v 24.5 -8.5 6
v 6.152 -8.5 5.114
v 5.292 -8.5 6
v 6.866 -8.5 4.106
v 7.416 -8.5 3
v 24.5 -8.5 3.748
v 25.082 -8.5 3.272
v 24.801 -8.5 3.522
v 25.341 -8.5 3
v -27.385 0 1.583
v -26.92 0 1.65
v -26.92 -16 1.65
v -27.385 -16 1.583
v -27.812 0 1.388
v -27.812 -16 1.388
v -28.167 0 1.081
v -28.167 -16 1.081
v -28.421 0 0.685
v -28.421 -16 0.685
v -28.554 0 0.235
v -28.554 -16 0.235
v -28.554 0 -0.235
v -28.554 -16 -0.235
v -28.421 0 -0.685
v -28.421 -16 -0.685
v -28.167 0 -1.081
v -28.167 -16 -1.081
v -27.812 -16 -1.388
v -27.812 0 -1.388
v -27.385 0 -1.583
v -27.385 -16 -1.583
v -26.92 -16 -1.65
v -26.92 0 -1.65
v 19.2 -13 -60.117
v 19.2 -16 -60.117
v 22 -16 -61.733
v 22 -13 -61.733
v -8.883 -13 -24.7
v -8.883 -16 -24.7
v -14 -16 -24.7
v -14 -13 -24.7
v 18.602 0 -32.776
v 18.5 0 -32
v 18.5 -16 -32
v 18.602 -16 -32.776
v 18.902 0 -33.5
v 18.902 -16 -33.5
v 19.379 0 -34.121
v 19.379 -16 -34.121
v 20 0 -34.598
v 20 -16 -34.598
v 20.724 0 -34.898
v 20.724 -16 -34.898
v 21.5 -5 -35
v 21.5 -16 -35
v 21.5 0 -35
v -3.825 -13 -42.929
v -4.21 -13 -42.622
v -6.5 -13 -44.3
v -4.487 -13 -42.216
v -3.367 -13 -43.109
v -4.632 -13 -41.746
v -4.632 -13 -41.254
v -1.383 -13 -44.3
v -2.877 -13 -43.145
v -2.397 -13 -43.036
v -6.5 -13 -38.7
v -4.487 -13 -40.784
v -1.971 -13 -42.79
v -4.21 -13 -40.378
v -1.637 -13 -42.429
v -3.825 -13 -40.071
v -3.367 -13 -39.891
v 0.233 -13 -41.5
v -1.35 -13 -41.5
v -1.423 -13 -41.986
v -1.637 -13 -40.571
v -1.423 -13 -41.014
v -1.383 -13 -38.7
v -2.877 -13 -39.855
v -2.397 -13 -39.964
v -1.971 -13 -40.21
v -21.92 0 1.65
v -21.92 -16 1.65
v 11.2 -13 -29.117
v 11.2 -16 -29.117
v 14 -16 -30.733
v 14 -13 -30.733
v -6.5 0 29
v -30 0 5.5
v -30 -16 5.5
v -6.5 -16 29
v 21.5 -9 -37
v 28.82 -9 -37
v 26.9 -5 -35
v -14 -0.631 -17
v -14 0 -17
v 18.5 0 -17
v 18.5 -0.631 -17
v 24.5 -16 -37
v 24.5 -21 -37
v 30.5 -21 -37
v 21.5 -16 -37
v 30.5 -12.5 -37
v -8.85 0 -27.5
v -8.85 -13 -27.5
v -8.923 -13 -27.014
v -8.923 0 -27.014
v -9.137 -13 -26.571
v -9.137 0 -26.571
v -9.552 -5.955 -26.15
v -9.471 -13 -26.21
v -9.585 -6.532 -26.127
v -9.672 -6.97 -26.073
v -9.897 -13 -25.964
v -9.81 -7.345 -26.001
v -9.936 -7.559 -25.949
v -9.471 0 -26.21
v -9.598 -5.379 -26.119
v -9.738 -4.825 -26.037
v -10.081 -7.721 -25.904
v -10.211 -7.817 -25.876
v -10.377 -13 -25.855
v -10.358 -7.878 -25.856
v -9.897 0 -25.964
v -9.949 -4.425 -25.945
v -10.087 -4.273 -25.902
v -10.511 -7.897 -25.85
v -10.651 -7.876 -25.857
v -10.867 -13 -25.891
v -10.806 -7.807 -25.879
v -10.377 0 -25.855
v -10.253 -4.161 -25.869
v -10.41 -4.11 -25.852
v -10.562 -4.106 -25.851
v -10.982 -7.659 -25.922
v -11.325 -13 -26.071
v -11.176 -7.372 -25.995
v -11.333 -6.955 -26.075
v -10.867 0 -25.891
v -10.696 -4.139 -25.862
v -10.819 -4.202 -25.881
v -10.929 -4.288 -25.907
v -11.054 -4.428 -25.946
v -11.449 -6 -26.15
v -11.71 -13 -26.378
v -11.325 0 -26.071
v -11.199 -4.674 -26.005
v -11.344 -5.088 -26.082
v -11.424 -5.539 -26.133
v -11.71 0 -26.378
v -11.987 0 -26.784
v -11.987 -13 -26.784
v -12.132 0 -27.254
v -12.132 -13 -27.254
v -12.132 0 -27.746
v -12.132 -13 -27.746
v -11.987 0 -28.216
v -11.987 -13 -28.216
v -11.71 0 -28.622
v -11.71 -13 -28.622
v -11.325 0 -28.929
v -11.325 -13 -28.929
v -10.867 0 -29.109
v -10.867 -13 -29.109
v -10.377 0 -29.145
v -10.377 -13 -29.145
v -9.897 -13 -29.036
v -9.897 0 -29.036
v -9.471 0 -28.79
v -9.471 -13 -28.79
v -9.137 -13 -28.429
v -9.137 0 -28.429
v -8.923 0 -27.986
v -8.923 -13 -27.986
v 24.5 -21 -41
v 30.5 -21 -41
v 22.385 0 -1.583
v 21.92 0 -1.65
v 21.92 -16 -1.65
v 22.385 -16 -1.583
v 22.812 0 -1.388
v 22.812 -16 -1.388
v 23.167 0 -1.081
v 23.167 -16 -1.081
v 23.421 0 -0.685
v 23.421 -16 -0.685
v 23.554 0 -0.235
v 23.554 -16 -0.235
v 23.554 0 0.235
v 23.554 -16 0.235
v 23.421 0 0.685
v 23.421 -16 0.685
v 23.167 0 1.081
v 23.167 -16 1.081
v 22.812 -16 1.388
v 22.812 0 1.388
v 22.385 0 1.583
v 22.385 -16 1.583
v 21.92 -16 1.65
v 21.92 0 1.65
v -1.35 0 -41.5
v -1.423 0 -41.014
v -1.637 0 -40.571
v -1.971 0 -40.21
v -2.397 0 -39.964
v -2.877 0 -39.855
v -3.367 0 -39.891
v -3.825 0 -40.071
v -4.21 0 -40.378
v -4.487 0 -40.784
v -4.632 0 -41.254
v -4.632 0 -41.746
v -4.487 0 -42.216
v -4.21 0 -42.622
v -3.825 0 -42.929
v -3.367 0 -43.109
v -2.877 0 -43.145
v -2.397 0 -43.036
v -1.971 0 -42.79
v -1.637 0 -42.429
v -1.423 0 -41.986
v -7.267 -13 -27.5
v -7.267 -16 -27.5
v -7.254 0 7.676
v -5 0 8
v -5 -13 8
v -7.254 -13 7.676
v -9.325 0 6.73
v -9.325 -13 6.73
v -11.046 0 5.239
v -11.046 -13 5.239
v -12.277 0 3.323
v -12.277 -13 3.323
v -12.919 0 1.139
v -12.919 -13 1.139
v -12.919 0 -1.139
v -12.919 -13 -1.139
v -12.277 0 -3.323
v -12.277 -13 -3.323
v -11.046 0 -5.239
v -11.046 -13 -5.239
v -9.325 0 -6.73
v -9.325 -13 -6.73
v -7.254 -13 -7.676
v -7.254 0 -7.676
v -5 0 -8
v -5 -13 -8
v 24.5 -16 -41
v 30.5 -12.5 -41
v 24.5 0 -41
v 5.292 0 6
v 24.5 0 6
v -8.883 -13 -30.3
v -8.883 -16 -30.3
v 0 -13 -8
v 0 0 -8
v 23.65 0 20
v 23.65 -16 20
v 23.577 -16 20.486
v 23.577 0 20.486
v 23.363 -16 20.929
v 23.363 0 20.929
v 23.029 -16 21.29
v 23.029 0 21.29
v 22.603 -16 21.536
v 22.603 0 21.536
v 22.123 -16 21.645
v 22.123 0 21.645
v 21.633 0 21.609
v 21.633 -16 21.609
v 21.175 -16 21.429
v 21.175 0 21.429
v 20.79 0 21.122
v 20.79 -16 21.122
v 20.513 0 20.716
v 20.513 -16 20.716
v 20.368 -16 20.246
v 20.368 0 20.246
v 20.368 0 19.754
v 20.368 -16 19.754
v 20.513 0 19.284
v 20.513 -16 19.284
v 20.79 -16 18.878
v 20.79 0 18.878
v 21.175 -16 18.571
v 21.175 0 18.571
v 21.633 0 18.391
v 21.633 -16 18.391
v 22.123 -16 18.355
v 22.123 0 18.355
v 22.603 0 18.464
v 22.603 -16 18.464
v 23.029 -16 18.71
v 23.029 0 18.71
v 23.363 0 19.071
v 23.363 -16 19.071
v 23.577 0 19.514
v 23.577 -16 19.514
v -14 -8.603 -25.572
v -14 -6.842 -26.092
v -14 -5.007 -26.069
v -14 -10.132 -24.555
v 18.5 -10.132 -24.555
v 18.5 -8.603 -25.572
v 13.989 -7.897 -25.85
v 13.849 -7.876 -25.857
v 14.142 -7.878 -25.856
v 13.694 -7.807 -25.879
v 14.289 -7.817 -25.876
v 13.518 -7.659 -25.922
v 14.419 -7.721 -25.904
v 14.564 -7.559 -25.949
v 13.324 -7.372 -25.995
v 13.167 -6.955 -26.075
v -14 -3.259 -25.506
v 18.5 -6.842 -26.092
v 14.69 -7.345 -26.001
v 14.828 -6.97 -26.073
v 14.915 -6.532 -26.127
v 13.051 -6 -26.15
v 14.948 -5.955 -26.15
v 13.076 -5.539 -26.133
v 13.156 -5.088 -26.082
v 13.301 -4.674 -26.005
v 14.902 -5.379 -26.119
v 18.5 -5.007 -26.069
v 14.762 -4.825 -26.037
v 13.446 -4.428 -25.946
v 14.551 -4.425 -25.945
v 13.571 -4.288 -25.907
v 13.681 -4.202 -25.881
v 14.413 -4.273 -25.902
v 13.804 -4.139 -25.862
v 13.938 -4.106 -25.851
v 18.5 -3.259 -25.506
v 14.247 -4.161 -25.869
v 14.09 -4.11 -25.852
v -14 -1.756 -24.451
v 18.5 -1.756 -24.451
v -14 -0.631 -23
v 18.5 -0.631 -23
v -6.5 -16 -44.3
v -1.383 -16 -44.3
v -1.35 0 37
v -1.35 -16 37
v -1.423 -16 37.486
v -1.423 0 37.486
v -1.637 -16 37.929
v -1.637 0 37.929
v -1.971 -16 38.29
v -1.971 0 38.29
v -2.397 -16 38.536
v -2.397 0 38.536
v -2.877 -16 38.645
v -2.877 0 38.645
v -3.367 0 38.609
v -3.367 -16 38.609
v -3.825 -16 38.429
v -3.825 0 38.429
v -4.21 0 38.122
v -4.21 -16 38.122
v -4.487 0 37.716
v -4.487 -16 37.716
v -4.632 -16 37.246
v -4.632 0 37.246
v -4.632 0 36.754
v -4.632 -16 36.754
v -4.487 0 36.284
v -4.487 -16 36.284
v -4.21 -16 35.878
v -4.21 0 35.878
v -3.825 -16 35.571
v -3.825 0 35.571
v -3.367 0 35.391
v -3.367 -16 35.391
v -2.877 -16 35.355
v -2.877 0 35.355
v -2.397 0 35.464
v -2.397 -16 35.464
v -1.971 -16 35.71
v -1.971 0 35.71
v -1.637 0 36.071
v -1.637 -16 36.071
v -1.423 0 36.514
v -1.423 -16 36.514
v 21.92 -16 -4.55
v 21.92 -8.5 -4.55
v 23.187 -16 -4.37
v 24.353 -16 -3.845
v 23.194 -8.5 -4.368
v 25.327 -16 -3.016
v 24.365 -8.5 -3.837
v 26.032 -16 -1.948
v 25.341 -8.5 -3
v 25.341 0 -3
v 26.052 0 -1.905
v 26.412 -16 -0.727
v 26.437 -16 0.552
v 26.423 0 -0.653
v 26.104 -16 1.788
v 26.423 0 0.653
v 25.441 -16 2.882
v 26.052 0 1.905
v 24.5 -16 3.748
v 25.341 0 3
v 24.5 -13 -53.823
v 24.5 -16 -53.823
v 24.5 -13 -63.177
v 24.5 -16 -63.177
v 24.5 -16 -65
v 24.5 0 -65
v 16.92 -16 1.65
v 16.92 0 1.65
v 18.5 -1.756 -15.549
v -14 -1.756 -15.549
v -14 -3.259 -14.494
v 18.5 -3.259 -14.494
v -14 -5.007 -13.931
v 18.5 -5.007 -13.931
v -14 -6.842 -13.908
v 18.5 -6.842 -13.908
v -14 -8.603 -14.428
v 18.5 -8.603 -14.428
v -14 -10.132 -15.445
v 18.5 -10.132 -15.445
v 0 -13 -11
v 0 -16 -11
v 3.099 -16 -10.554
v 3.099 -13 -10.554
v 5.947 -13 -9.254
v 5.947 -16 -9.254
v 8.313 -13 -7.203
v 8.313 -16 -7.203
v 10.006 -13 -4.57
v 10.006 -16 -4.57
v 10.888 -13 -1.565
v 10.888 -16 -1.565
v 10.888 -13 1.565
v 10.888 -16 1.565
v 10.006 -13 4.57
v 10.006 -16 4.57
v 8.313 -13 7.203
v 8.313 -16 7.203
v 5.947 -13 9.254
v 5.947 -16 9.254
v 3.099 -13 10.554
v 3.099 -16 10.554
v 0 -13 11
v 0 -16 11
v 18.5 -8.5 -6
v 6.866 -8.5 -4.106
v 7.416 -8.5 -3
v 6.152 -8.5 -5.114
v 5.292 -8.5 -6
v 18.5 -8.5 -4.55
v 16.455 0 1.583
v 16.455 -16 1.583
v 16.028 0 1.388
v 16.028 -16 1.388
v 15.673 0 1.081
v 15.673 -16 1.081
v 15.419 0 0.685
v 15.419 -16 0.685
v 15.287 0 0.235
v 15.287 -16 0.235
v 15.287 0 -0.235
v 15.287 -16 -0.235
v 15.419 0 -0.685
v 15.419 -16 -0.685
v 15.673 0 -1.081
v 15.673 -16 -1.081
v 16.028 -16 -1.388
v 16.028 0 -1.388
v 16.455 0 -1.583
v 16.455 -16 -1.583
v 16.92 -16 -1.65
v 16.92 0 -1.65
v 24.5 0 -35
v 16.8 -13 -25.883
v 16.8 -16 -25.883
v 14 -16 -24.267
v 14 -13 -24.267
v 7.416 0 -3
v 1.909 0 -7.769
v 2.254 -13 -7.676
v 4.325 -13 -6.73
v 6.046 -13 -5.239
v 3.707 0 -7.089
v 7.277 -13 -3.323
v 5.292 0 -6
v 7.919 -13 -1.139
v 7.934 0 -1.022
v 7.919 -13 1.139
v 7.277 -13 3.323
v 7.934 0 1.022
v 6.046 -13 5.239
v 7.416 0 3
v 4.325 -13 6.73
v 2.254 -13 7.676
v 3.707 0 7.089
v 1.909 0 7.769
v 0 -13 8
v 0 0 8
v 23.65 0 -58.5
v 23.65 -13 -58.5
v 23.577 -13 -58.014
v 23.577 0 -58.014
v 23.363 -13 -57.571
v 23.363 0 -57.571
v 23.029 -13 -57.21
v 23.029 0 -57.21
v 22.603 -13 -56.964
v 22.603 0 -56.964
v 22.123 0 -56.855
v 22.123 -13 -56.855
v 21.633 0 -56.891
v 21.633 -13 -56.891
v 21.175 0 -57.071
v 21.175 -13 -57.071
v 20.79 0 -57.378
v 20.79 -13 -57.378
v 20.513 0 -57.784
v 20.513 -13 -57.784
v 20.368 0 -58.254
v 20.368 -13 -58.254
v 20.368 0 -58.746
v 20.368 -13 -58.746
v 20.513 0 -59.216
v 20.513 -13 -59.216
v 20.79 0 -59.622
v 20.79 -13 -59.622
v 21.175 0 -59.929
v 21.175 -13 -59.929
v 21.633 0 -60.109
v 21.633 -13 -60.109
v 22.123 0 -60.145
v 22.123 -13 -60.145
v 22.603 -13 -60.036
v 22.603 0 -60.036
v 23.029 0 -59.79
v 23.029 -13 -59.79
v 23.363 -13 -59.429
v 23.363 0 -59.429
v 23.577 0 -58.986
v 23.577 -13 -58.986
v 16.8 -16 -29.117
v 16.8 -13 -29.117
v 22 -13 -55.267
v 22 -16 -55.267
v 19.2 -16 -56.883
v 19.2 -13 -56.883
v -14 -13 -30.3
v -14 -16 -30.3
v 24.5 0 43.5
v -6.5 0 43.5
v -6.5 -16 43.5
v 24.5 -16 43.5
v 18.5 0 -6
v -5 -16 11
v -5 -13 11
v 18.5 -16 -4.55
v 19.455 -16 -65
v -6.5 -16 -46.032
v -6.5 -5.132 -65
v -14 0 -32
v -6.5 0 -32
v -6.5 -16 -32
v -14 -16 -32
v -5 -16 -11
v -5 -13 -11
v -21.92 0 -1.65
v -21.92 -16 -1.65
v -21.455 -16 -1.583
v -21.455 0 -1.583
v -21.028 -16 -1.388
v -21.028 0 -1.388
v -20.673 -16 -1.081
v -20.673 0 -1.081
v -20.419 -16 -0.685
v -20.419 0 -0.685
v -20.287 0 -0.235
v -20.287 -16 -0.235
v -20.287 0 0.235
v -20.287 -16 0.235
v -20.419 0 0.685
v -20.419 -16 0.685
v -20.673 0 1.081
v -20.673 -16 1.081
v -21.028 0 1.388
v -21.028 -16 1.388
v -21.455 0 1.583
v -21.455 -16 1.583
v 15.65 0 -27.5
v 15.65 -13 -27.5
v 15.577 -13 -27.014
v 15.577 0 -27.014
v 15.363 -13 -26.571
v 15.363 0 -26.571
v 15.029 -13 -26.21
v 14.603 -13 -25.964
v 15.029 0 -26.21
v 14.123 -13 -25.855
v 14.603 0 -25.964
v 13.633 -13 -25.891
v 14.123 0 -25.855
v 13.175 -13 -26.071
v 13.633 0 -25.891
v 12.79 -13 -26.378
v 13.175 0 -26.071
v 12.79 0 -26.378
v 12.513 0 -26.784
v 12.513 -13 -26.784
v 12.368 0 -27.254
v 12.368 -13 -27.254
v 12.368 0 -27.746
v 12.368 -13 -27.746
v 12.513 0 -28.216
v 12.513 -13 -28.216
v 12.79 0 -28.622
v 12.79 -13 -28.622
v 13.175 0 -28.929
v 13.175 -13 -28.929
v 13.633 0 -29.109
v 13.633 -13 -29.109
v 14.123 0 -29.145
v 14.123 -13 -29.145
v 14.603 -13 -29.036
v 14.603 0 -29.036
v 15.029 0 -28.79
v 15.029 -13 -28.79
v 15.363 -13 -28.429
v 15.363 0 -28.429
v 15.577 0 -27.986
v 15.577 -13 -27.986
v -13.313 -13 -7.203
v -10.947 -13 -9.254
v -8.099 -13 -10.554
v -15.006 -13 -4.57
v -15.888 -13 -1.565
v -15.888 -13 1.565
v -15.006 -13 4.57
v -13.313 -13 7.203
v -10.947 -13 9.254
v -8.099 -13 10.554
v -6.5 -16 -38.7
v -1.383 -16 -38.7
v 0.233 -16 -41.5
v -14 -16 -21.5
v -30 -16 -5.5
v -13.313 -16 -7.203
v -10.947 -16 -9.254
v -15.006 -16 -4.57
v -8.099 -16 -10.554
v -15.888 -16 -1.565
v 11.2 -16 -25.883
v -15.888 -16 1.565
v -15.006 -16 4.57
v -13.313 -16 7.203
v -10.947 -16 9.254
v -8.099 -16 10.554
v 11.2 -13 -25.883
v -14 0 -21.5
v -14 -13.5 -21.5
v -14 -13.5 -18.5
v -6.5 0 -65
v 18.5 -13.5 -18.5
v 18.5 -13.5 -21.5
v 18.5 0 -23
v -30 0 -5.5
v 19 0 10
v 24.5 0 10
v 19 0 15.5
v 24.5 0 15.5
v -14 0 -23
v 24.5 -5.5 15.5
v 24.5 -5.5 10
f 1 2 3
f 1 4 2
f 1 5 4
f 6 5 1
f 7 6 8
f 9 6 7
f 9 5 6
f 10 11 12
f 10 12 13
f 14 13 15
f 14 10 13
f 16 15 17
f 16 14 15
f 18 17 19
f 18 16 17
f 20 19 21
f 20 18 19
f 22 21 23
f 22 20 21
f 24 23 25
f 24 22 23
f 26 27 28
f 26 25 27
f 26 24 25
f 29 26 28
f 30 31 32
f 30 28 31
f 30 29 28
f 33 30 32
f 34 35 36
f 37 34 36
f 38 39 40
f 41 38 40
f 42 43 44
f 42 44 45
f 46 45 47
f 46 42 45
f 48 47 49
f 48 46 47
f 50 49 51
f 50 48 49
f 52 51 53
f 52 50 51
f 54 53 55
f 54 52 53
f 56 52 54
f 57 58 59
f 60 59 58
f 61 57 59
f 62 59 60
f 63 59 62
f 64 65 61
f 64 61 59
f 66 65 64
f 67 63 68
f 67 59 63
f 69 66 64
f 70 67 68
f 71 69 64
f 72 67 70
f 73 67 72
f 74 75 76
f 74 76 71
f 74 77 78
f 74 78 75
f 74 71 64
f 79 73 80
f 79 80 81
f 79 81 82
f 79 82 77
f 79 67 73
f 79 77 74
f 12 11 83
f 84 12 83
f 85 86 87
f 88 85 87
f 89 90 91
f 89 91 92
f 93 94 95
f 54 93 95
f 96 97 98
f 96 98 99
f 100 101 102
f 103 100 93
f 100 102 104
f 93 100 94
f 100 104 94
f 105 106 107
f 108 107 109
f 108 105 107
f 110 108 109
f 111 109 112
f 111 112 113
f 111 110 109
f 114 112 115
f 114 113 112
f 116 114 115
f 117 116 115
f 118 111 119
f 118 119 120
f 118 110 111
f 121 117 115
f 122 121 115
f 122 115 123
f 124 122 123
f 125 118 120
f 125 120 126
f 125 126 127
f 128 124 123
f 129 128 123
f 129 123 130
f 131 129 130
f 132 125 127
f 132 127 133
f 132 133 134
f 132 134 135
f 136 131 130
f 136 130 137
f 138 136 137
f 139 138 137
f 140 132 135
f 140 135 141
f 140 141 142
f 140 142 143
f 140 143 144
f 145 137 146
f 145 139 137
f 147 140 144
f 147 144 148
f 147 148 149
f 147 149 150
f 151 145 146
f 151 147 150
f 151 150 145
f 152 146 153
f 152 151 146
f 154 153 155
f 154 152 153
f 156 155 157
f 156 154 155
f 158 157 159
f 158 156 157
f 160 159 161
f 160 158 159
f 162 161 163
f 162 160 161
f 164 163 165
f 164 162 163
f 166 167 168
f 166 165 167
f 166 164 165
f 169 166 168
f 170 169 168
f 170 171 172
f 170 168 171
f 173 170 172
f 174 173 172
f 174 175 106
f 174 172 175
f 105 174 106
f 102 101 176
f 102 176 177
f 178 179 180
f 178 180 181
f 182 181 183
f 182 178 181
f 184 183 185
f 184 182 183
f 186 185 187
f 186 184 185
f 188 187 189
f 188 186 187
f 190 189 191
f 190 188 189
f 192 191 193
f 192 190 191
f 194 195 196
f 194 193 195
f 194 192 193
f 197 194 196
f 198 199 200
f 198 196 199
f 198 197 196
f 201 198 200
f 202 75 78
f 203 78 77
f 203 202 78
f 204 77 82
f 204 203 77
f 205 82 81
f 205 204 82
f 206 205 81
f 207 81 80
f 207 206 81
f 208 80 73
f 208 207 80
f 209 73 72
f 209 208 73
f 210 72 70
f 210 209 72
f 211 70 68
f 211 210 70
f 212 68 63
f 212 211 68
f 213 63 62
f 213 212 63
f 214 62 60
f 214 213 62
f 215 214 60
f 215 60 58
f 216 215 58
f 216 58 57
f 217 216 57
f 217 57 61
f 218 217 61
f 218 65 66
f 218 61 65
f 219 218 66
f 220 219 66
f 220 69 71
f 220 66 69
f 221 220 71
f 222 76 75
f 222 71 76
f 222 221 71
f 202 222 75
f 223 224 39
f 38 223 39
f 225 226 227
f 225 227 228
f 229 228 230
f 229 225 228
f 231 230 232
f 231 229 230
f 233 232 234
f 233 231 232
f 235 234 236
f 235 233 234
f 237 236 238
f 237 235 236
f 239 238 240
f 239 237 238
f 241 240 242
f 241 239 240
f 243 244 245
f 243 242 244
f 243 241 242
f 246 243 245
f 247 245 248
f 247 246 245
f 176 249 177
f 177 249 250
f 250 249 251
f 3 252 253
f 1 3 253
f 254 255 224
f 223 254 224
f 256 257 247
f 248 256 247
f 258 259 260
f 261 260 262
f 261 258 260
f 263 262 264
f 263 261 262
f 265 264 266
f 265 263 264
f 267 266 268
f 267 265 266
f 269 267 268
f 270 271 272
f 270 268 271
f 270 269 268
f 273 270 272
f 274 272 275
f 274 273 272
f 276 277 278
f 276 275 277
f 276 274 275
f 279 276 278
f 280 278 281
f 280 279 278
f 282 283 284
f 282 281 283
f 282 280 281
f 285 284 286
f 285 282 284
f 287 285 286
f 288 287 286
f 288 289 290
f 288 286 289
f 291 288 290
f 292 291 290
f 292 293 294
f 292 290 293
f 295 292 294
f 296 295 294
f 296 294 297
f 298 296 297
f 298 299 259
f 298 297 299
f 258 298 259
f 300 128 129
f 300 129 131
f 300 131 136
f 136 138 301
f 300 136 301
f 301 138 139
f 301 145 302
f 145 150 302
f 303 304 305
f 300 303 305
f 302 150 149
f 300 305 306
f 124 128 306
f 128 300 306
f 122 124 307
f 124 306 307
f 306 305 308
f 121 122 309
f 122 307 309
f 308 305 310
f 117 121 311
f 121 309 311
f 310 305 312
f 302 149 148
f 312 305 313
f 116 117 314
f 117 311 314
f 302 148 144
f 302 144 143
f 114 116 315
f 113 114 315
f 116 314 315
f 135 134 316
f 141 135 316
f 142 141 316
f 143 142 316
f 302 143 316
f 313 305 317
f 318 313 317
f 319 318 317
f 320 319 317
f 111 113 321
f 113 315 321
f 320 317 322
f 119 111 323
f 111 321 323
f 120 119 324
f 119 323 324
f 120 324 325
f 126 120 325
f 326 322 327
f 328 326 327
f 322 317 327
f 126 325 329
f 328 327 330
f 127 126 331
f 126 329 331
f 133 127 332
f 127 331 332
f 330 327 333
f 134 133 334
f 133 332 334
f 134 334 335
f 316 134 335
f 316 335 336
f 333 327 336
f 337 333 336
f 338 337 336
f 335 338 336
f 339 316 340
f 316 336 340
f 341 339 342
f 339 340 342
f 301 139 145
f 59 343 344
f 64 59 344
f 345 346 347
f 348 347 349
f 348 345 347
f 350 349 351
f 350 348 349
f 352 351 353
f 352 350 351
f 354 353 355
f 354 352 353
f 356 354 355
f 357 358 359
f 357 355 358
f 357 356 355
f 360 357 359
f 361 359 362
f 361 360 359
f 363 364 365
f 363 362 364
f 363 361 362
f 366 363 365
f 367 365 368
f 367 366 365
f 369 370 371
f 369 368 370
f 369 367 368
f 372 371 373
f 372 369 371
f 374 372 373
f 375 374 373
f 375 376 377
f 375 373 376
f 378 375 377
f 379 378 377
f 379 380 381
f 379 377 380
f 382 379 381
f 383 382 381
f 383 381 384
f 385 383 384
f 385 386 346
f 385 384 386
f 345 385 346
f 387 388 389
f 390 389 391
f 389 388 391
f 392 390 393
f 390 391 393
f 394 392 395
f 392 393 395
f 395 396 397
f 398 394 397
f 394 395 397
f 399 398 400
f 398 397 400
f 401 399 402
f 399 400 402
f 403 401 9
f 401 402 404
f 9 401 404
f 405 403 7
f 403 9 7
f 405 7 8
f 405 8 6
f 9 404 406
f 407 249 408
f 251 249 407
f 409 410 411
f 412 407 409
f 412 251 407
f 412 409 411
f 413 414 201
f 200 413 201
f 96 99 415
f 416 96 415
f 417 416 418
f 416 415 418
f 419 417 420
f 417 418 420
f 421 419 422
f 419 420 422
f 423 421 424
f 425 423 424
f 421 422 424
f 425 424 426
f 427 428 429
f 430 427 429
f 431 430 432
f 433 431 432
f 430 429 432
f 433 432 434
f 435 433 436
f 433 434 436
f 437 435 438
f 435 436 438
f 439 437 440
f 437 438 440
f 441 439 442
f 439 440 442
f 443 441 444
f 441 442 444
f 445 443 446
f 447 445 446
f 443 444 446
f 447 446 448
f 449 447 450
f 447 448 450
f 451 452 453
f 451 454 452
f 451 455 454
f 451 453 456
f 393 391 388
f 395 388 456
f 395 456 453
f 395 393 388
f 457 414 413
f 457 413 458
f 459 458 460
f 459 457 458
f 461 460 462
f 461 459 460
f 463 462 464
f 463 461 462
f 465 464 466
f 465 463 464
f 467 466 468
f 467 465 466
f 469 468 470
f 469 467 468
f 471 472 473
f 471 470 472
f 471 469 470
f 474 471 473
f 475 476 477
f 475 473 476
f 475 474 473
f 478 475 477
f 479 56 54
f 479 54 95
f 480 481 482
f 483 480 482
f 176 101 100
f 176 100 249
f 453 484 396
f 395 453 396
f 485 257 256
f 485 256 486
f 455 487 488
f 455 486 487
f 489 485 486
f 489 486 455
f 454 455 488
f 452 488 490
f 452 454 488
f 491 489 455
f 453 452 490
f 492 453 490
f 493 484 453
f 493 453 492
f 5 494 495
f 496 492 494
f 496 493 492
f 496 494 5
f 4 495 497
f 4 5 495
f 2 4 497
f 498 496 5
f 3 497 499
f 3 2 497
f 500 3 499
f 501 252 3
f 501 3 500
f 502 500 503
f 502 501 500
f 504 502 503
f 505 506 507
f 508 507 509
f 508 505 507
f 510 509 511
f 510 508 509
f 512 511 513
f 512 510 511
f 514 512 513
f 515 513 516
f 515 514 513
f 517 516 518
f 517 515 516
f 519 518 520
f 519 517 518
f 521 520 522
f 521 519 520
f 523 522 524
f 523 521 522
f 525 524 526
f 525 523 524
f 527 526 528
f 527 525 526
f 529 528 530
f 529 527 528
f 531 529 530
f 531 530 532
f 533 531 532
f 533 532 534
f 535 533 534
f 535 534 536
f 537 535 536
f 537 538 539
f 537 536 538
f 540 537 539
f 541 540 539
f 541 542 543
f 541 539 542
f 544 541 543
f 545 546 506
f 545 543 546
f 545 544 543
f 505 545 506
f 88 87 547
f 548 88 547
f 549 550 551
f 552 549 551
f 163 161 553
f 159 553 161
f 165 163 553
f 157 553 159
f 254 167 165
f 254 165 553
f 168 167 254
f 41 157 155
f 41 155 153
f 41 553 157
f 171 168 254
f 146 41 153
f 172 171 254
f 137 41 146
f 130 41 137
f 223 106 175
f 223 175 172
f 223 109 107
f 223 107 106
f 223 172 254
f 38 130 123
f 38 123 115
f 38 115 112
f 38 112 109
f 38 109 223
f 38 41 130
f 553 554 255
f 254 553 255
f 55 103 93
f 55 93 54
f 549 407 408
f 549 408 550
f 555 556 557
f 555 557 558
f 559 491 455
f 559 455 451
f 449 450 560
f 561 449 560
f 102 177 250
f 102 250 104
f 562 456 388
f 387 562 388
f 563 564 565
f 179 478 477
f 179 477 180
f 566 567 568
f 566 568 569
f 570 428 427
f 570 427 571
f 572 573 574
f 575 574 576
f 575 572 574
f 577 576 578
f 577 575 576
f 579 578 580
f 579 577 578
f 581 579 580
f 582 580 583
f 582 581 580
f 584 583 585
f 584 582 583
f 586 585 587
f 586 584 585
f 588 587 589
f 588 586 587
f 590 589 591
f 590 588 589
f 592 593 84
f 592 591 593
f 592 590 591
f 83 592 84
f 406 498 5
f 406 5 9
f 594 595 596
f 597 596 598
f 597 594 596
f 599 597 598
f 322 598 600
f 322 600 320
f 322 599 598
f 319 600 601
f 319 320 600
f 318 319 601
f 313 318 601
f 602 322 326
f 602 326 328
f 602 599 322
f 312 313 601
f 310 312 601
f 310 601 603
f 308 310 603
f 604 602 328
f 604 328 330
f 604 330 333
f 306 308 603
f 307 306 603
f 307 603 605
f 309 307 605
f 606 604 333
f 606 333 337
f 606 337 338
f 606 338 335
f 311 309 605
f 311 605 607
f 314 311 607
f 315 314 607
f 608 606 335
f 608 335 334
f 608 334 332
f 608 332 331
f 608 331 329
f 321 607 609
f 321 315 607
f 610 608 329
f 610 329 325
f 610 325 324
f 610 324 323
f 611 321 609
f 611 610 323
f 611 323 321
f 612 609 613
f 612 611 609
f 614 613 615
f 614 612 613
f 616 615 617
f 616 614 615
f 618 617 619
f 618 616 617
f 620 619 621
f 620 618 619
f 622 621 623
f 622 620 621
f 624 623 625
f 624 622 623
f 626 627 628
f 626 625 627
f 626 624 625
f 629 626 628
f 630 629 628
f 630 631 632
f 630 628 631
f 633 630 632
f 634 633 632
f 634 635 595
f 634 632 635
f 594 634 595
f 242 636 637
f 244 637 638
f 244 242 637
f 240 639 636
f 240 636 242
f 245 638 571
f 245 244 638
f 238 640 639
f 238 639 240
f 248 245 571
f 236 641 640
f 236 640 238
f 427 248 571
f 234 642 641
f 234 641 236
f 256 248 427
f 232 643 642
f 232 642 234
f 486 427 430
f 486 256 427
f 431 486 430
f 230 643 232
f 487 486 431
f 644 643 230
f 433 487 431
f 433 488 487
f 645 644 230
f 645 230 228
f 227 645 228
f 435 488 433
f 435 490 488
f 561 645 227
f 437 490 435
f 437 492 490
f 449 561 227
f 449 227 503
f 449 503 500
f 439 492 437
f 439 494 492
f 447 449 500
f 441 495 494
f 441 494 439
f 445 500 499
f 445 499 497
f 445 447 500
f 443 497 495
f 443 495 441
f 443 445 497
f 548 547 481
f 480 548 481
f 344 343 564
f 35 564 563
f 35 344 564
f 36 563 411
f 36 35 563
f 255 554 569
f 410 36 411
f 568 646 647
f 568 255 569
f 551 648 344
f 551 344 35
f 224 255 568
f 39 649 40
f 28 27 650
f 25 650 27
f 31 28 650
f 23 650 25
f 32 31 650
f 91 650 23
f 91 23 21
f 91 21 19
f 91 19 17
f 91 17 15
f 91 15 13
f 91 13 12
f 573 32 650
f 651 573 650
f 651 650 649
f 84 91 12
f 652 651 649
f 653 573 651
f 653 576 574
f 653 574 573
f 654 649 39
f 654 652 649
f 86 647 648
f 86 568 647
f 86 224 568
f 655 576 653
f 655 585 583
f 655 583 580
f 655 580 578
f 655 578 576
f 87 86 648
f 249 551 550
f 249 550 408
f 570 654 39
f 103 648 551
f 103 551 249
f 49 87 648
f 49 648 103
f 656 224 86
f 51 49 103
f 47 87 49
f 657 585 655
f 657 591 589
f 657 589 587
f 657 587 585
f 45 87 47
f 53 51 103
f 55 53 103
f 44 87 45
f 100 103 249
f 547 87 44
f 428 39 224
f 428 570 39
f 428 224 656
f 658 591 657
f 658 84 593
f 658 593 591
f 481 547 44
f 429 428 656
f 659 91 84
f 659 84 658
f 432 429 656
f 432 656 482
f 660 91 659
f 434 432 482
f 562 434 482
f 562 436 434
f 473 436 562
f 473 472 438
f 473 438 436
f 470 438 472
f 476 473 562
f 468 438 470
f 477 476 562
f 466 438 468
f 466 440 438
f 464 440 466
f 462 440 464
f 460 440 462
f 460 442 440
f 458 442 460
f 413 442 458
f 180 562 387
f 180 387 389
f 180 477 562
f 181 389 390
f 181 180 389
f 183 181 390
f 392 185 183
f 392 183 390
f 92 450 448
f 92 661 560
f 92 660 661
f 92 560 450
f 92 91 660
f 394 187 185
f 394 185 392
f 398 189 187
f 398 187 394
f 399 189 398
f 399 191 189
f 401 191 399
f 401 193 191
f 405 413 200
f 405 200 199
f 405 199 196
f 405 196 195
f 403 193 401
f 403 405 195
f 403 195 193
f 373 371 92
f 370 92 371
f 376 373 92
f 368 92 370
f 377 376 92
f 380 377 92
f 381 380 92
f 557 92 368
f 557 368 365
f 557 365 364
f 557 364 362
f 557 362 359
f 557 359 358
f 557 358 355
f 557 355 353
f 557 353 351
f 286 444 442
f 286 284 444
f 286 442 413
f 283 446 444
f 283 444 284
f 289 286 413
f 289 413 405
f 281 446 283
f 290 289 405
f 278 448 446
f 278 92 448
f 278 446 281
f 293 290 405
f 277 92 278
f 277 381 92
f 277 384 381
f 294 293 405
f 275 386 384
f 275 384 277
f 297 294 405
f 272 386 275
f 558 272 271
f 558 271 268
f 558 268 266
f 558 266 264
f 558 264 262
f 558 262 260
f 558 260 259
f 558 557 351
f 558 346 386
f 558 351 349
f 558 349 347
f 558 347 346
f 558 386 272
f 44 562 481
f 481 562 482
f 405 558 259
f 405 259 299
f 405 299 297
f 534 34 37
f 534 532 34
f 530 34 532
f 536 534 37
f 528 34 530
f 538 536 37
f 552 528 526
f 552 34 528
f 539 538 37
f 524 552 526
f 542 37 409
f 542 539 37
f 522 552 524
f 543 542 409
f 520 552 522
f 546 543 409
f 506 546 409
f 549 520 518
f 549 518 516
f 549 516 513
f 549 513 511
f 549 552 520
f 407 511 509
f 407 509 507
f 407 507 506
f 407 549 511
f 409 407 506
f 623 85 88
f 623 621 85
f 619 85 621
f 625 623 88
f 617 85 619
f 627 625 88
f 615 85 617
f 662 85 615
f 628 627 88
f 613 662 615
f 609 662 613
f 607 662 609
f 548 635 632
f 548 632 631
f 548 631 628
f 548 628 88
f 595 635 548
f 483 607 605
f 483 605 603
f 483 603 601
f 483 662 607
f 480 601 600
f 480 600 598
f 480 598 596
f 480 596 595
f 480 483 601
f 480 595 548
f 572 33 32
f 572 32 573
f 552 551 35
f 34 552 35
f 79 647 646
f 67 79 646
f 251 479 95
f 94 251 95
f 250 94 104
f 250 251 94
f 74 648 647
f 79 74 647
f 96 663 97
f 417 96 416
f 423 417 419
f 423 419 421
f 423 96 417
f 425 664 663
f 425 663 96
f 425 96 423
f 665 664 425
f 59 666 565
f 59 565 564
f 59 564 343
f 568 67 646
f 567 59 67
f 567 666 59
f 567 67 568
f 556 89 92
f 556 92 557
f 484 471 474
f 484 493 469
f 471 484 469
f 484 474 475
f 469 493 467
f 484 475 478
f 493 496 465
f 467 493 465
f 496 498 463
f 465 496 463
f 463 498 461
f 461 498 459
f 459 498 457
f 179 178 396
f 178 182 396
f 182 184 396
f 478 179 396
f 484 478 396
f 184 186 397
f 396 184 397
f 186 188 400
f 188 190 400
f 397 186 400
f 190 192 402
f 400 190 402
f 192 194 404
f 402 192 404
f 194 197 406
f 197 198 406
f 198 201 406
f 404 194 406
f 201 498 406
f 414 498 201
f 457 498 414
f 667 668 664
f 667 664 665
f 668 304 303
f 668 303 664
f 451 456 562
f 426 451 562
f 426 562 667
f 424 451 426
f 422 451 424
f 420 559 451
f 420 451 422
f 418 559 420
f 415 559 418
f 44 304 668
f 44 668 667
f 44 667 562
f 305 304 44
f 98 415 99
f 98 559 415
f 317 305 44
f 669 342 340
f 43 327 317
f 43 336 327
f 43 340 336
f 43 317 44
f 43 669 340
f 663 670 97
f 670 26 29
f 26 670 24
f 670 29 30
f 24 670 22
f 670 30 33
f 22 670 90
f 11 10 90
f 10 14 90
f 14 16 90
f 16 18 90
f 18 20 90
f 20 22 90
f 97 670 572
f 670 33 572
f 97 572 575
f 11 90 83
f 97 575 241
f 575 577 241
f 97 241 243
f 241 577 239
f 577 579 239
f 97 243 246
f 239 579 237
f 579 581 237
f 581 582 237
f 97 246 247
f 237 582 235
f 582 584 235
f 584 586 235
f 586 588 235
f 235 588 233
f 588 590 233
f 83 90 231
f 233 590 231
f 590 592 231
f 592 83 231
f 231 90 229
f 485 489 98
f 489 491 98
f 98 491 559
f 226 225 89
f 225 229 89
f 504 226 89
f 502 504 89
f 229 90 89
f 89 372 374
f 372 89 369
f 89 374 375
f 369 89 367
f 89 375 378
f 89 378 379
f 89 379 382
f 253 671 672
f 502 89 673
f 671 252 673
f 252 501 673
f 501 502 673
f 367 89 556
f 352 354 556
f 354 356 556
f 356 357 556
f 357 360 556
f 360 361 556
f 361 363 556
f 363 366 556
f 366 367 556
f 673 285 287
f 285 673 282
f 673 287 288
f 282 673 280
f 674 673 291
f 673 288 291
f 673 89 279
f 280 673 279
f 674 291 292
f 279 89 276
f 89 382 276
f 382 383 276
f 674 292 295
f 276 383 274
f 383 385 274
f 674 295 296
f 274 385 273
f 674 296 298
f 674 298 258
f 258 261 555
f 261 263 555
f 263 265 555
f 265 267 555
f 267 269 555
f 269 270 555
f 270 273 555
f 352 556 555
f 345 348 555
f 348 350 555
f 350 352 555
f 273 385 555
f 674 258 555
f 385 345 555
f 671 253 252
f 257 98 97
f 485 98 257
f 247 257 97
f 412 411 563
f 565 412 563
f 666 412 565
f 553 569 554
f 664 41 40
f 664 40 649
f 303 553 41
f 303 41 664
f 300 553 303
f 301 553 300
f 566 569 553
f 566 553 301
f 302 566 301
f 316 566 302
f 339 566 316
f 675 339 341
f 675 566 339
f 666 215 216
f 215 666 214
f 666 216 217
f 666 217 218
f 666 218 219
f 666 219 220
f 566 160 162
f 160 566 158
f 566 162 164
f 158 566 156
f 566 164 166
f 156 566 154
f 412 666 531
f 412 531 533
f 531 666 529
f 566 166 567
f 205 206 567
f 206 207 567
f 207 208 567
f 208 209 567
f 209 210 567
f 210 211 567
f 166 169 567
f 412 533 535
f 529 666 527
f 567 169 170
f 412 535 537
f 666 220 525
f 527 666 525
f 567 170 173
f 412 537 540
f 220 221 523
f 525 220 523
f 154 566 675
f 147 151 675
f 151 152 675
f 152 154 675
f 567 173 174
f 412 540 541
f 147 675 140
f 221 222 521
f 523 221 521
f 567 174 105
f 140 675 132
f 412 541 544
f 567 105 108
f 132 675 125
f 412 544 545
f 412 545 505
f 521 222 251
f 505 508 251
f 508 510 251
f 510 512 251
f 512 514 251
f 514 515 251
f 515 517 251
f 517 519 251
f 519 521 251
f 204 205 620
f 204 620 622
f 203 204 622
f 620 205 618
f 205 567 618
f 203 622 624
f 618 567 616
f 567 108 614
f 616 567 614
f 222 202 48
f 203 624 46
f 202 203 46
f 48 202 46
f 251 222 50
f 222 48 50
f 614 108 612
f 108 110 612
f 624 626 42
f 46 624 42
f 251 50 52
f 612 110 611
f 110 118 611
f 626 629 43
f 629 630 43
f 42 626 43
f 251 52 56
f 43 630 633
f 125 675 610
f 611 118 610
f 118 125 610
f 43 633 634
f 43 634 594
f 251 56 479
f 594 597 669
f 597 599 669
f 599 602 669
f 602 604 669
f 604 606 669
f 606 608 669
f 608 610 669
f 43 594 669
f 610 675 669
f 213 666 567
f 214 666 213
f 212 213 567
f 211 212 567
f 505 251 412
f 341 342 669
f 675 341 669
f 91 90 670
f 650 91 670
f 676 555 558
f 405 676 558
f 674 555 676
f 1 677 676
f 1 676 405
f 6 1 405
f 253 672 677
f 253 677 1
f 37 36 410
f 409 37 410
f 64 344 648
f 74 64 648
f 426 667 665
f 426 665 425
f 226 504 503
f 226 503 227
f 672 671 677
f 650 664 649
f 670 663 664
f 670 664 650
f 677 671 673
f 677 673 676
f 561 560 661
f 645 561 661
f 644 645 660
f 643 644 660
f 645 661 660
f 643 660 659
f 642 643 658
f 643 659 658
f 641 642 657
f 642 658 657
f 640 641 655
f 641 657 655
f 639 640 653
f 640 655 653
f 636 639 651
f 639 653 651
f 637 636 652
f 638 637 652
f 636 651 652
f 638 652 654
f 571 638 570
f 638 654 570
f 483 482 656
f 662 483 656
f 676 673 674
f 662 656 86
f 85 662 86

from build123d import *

# Parameters (mm, degrees)
SKETCH001_R     = 1.65
PAD_DEPTH       = 21
POCKET_DEPTH    = 3
POCKET001_DEPTH = 5
POCKET002_DEPTH = 62.9786
SKETCH005_W     = 30
SKETCH005_H     = 3
POCKET003_DEPTH = 8.5
POCKET004_DEPTH = 32.5
POCKET005_DEPTH = 6
POCKET006_DEPTH = 9
POCKET007_DEPTH = 5.5


with BuildPart() as part:
    # Sketch001 → Pad (new body)
    with BuildSketch(Plane.XZ):
        with BuildLine():
            ThreePointArc((21.92031, -4.55), (26.265193, -1.350737), (24.5, 3.748026))
            Line((24.5, 43.5), (24.5, 3.748026))
            Line((-6.5, 43.5), (24.5, 43.5))
            Line((-6.5, 29), (-6.5, 43.5))
            Line((-30, 5.5), (-6.5, 29))
            Line((-30, 5.5), (-30, -5.5))
            Line((-14, -21.5), (-30, -5.5))
            Line((-14, -32), (-14, -21.5))
            Line((-6.5, -32), (-14, -32))
            Line((-6.5, -65), (-6.5, -32))
            Line((24.5, -65), (-6.5, -65))
            Line((24.5, -41), (24.5, -65))
            Line((24.5, -41), (30.5, -41))
            Line((30.5, -41), (30.5, -35))
            Line((21.5, -35), (30.5, -35))
            ThreePointArc((18.5, -32), (19.37868, -34.12132), (21.5, -35))
            Line((18.5, -4.55), (18.5, -32))
            Line((18.5, -4.55), (21.92031, -4.55))
        make_face()
        with Locations((22, 20)):
            Circle(SKETCH001_R, mode=Mode.SUBTRACT)
        with Locations((-3, 37)):
            Circle(SKETCH001_R, mode=Mode.SUBTRACT)
        with Locations((-10.5, -27.5)):
            Circle(SKETCH001_R, mode=Mode.SUBTRACT)
        with Locations((14, -27.5)):
            Circle(SKETCH001_R, mode=Mode.SUBTRACT)
        with Locations((-3, -41.5)):
            Circle(SKETCH001_R, mode=Mode.SUBTRACT)
        with Locations((22, -58.5)):
            Circle(SKETCH001_R, mode=Mode.SUBTRACT)
        with BuildLine():
            ThreePointArc((0, -8), (8, 0), (0, 8))
            Line((0, 8), (-5, 8))
            ThreePointArc((-5, 8), (-13, 0), (-5, -8))
            Line((0, -8), (-5, -8))
        make_face(mode=Mode.SUBTRACT)
        with BuildLine():
            ThreePointArc((16.92031, 1.65), (15.27031, 0), (16.92031, -1.65))
            Line((16.92031, -1.65), (21.92031, -1.65))
            ThreePointArc((21.92031, -1.65), (23.57031, 0), (21.92031, 1.65))
            Line((16.92031, 1.65), (21.92031, 1.65))
        make_face(mode=Mode.SUBTRACT)
        with BuildLine():
            ThreePointArc((-26.92031, 1.65), (-28.57031, 0), (-26.92031, -1.65))
            Line((-26.92031, -1.65), (-21.92031, -1.65))
            ThreePointArc((-21.92031, -1.65), (-20.27031, 0), (-21.92031, 1.65))
            Line((-26.92031, 1.65), (-21.92031, 1.65))
        make_face(mode=Mode.SUBTRACT)
    extrude(amount=PAD_DEPTH)

    # Sketch002 → Pocket (cut)
    with BuildSketch(Plane.XZ.offset(16)):
        Polygon((-8.883419, -24.7), (-12.116581, -24.7), (-14.266838, -24.7), (-14.266838, -30.3), (-12.116581, -30.3), (-8.883419, -30.3), (-7.266838, -27.5), align=None)
        Polygon((14, -24.266838), (11.2, -25.883419), (11.2, -29.116581), (14, -30.733162), (16.8, -29.116581), (16.8, -25.883419), align=None)
        Polygon((22, -55.266838), (19.2, -56.883419), (19.2, -60.116581), (22, -61.733162), (26.2, -64.158033), (26.2, -52.841967), align=None)
        Polygon((-1.383419, -38.7), (-4.616581, -38.7), (-6.766838, -38.7), (-6.766838, -44.3), (-4.616581, -44.3), (-1.383419, -44.3), (0.233162, -41.5), align=None)
        with BuildLine():
            ThreePointArc((0, -11), (11, 0), (0, 11))
            Line((0, 11), (-5, 11))
            ThreePointArc((-5, 11), (-16, 0), (-5, -11))
            Line((0, -11), (-5, -11))
        make_face()
    extrude(amount=-POCKET_DEPTH, mode=Mode.SUBTRACT)

    # Sketch003 → Pocket001 (cut)
    with BuildSketch(Plane.XZ.offset(21)):
        with BuildLine():
            ThreePointArc((21.92031, -4.55), (26.265193, -1.350737), (24.5, 3.748026))
            Line((24.5, 43.5), (24.5, 3.748026))
            Line((-6.5, 43.5), (24.5, 43.5))
            Line((-6.5, 29), (-6.5, 43.5))
            Line((-30, 5.5), (-6.5, 29))
            Line((-30, 5.5), (-30, -5.5))
            Line((-14, -21.5), (-30, -5.5))
            Line((-14, -32), (-14, -21.5))
            Line((-6.5, -32), (-14, -32))
            Line((-6.5, -65), (-6.5, -32))
            Line((24.5, -65), (-6.5, -65))
            Line((24.5, -35), (24.5, -65))
            Line((21.5, -35), (24.5, -35))
            ThreePointArc((18.5, -32), (19.37868, -34.12132), (21.5, -35))
            Line((18.5, -4.55), (18.5, -32))
            Line((18.5, -4.55), (21.92031, -4.55))
        make_face()
    extrude(amount=-POCKET001_DEPTH, mode=Mode.SUBTRACT)

    # Sketch004 → Pocket002 (cut, through all)
    with BuildSketch(Plane(origin=(0, 0, 0), x_dir=(0.590042, 0, 0.807372), z_dir=(-0.807372, 0, 0.590042))):
        Polygon((-56.5, -5), (-56.5, -16), (-41, -16), align=None)
    extrude(amount=-POCKET002_DEPTH, mode=Mode.SUBTRACT)

    # Sketch005 (on Face2 of Pocket002) → Pocket003 (cut)
    with BuildSketch(Plane(origin=(0, 0, 0), x_dir=(1, 0, 0), z_dir=(0, 1, 0))):
        with Locations((15, 4.5)):
            Rectangle(SKETCH005_W, SKETCH005_H)
        with Locations((15, -4.5)):
            Rectangle(SKETCH005_W, SKETCH005_H)
    extrude(amount=-POCKET003_DEPTH, mode=Mode.SUBTRACT)

    # Sketch006 (on Face5 of Pocket003) → Pocket004 (cut)
    with BuildSketch(Plane(origin=(18.5, 0, 0), x_dir=(0, 0, 1), z_dir=(1, 0, 0))):
        with BuildLine():
            ThreePointArc((-24.555141, 10.131972), (-26.069229, 5.006539), (-23, 0.631341))
            Line((-23, 0.631341), (-23, -1))
            Line((-23, -1), (-17, -1))
            Line((-17, -1), (-17, 0.631341))
            ThreePointArc((-17, 0.631341), (-13.930771, 5.006539), (-15.444859, 10.131972))
            Line((-18.5, 13.5), (-15.444859, 10.131972))
            Line((-21.5, 13.5), (-18.5, 13.5))
            Line((-24.555141, 10.131972), (-21.5, 13.5))
        make_face()
    extrude(amount=-POCKET004_DEPTH, mode=Mode.SUBTRACT)

    # Sketch007 (on Face79 of Pocket004) → Pocket005 (cut)
    with BuildSketch(Plane(origin=(0, 0, -41), x_dir=(1, 0, 0), z_dir=(0, 0, -1))):
        Polygon((24.5, 0), (30.5, 12.5), (30.5, 0), align=None)
    extrude(amount=-POCKET005_DEPTH, mode=Mode.SUBTRACT)

    # Sketch008 (on Face78 of Pocket005) → Pocket006 (cut)
    with BuildSketch(Plane(origin=(30.5, 0, 0), x_dir=(0, 0, 1), z_dir=(1, 0, 0))):
        Polygon((-37, 21), (-37, 9), (-35, 5), (-35, 21), align=None)
    extrude(amount=-POCKET006_DEPTH, mode=Mode.SUBTRACT)

    # Sketch009 → Pocket007 (cut)
    with BuildSketch(Plane.XY.offset(10)):
        Polygon((19, 0), (24.5, -5.5), (24.5, 0), align=None)
    extrude(amount=POCKET007_DEPTH, mode=Mode.SUBTRACT)


solid = part.part
